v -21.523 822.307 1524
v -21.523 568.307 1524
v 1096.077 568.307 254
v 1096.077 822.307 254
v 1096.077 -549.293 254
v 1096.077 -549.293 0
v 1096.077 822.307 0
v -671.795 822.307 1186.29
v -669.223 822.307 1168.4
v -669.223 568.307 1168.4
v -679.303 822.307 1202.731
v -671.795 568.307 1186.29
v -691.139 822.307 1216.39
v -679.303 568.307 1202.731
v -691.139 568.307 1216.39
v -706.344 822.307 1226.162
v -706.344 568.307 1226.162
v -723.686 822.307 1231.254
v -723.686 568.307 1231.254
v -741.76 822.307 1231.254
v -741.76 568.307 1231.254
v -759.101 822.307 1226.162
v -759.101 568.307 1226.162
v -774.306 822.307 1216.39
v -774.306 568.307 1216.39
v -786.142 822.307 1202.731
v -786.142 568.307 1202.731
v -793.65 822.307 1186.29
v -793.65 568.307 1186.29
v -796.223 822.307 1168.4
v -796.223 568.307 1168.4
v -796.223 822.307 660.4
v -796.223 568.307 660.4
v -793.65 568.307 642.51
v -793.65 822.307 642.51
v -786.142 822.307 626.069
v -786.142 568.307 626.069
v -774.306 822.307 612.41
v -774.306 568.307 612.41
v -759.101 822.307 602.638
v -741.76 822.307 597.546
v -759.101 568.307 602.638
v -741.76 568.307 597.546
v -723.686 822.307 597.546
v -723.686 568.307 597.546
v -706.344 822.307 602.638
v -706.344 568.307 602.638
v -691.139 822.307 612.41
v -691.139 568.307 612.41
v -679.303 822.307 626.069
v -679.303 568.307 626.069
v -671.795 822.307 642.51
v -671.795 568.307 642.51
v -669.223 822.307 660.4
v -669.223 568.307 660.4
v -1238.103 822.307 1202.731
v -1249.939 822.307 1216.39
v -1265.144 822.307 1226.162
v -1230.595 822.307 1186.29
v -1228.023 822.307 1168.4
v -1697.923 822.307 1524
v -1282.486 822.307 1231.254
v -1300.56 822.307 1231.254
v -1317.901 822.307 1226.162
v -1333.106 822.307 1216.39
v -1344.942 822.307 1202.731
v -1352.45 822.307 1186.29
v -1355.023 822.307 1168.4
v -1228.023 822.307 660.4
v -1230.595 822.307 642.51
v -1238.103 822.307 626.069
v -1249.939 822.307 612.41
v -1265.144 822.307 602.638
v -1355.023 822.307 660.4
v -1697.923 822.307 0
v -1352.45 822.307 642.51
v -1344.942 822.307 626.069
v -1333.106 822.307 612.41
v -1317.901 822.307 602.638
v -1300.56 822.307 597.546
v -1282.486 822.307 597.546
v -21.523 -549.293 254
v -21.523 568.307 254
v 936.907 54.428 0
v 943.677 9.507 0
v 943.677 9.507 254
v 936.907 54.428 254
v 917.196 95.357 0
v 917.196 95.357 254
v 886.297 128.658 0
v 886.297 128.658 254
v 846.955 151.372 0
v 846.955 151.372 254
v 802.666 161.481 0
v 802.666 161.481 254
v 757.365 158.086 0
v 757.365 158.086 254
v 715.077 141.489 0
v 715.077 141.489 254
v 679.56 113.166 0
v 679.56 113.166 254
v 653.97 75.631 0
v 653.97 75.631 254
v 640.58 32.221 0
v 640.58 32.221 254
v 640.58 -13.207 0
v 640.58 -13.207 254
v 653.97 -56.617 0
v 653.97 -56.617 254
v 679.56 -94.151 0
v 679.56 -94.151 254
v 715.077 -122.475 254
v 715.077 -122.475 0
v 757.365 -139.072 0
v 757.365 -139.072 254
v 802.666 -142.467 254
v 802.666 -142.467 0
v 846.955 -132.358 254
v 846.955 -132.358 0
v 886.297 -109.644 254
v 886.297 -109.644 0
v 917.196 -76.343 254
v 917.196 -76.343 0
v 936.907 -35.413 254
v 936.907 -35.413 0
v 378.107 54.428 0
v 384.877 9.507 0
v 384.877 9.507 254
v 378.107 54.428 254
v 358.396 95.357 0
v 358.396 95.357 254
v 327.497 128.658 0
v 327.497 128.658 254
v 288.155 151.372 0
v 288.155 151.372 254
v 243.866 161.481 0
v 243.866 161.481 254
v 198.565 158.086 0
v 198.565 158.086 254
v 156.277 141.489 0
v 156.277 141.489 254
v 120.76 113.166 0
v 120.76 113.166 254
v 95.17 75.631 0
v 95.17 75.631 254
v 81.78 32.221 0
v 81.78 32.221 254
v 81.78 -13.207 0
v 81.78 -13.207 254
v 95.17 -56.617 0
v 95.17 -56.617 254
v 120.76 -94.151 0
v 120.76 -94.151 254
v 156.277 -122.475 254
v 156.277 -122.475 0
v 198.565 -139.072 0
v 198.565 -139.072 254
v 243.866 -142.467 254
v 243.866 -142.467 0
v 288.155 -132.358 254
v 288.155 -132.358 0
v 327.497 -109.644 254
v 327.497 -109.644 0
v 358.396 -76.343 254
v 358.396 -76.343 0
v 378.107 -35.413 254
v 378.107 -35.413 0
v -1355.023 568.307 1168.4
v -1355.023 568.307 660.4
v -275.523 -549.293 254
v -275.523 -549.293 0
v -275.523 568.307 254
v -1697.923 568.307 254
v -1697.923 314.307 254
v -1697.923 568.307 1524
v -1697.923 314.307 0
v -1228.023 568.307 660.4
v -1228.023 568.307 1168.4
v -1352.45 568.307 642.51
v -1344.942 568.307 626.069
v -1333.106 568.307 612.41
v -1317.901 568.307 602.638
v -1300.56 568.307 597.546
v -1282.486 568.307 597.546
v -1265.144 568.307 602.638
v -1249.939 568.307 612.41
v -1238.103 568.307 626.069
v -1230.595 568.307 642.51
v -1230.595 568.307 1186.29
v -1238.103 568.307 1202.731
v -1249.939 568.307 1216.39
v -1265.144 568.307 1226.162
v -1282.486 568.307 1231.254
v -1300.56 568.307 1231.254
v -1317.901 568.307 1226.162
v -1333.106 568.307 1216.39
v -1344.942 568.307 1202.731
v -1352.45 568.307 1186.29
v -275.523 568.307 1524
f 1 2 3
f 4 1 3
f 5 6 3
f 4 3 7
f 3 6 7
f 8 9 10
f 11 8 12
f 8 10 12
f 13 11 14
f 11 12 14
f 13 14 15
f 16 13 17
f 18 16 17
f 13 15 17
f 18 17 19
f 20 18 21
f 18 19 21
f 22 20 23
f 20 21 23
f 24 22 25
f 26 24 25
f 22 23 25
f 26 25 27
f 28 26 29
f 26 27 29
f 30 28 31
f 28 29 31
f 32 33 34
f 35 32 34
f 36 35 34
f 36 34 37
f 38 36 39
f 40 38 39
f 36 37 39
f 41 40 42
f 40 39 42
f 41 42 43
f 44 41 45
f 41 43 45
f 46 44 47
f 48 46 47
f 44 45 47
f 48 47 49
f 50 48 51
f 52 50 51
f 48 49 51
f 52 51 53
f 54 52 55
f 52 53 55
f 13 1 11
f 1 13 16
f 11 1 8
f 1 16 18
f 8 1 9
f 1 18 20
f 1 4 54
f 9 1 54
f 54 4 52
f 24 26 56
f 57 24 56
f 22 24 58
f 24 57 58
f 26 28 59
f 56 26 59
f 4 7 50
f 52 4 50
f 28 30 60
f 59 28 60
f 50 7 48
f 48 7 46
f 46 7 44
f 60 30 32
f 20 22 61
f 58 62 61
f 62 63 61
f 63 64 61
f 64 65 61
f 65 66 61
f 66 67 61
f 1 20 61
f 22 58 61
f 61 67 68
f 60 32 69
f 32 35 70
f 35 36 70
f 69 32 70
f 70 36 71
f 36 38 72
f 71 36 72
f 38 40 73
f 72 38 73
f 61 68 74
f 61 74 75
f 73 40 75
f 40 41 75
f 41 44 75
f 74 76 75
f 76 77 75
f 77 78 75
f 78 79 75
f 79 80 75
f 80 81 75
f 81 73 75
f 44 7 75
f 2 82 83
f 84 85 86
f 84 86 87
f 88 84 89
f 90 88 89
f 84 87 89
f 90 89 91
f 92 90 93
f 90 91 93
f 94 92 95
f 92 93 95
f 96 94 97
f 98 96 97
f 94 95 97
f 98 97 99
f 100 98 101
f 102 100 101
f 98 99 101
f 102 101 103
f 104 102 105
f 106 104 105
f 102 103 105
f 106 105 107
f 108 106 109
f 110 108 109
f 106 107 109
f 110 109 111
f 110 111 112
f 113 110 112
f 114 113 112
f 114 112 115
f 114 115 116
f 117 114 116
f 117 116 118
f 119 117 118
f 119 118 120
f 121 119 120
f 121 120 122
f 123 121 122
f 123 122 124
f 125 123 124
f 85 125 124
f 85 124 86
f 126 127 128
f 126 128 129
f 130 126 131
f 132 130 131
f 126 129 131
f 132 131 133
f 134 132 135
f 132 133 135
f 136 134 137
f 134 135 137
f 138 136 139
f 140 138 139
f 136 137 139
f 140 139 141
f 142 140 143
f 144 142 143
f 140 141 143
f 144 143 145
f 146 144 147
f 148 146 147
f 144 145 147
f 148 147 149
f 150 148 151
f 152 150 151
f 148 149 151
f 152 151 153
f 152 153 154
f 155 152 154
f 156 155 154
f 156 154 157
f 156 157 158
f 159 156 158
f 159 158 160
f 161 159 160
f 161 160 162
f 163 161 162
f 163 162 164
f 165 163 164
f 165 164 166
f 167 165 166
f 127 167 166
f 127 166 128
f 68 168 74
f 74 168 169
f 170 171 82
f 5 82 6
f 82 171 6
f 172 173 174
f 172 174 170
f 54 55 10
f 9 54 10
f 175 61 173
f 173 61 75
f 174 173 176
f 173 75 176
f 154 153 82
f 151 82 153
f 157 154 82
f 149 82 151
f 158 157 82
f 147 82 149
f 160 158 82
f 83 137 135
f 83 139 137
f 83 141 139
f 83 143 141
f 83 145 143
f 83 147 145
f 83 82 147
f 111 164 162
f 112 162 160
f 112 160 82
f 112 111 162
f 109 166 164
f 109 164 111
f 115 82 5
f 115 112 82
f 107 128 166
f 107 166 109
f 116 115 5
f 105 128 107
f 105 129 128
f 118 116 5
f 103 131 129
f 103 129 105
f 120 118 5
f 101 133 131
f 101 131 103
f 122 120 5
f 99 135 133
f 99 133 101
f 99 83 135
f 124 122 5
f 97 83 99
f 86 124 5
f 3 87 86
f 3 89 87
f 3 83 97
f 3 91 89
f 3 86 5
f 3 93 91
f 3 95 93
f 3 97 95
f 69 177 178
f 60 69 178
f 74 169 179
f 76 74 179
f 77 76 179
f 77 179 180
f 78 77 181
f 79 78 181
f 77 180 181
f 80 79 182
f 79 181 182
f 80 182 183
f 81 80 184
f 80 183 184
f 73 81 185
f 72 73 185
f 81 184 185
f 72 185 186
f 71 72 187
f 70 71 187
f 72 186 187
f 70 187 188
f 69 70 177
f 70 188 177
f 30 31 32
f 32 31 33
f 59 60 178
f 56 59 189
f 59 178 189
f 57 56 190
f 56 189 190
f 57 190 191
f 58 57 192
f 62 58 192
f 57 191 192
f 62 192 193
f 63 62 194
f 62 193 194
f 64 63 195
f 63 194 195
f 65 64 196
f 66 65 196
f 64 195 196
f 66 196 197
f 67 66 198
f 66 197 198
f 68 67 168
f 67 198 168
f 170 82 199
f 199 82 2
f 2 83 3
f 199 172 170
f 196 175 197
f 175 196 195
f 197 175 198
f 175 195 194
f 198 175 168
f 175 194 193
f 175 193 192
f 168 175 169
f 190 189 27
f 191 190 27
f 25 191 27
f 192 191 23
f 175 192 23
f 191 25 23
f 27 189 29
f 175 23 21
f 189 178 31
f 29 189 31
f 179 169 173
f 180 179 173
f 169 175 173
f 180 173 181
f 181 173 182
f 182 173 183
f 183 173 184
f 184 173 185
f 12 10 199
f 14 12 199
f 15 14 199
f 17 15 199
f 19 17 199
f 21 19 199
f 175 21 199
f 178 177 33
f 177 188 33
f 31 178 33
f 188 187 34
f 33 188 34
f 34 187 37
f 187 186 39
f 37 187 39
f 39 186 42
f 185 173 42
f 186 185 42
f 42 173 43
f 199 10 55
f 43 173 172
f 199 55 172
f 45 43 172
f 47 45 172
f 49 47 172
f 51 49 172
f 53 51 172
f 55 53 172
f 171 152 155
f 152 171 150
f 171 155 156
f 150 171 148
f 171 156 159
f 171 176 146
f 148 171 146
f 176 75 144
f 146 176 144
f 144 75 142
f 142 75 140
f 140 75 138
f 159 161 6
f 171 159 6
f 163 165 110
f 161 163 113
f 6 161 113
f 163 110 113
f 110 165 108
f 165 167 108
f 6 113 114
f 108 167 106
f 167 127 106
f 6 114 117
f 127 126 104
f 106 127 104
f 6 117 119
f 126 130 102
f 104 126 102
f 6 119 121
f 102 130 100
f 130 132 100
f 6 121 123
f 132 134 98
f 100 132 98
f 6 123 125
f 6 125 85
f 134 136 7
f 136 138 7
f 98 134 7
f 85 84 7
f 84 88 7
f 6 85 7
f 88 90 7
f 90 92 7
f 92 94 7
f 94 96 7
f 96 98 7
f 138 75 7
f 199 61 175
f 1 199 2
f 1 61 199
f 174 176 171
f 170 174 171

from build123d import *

# Parameters (mm, degrees)
F1_DEPTH  = 254
F3_DEPTH  = 1270
F5_DEPTH  = 701.04
F7_DEPTH  = 2278.38
F9_DEPTH  = 584.2
F10_R     = 152.4
F11_DEPTH = 1562.1


with BuildPart() as f1:
    # F0 (on Top) → F1 (new body)
    with BuildSketch(Plane.XY):
        Polygon((-1697.922529542, 314.3072188771), (-275.522529542, -549.2927811229), (1096.077470458, -549.2927811229), (1096.077470458, 822.3072188771), (-1697.922529542, 822.3072188771), align=None)
    extrude(amount=F1_DEPTH)

    # F2 (on face) → F3 (join)
    with BuildSketch(Plane.XY.offset(254)):
        Polygon((-275.522529542, 568.3072188771), (-275.522529542, -549.2927811229), (-21.522529542, -549.2927811229), (-21.522529542, 568.3072188771), (1096.077470458, 568.3072188771), (1096.077470458, 822.3072188771), (-1697.922529542, 822.3072188771), (-1697.922529542, 568.3072188771), align=None)
    extrude(amount=F3_DEPTH)

    # F4 (on face) → F5 (cut)
    with BuildSketch(Plane.XZ.offset(-568.3072188771)):
        Polygon((1096.077470458, 1524), (-21.522529542, 1524), (1096.077470458, 254), align=None)
    extrude(amount=-F5_DEPTH, mode=Mode.SUBTRACT)

    # F6 (on face) → F7 (cut)
    with BuildSketch(Plane.YZ.offset(-21.522529542)):
        Polygon((-549.2927811229, 254), (568.3072188771, 1524), (-549.2927811229, 1524), align=None)
    extrude(amount=-F7_DEPTH, mode=Mode.SUBTRACT)

    # F8 (on face) → F9 (cut)
    with BuildSketch(Plane.XZ.offset(-568.3072188771)):
        with BuildLine():
            ThreePointArc((-1355.022529542, 1168.4), (-1291.522529542, 1104.9), (-1228.022529542, 1168.4))
            ThreePointArc((-1228.022529542, 1168.4), (-1291.522529542, 1231.9), (-1355.022529542, 1168.4))
        make_face()
        with BuildLine():
            Line((-1228.022529542, 660.4), (-1228.022529542, 1168.4))
            ThreePointArc((-1228.022529542, 1168.4), (-1291.522529542, 1104.9), (-1355.022529542, 1168.4))
            Line((-1355.022529542, 1168.4), (-1355.022529542, 660.4))
            ThreePointArc((-1355.022529542, 660.4), (-1291.522529542, 723.9), (-1228.022529542, 660.4))
        make_face()
        with BuildLine():
            ThreePointArc((-1355.022529542, 660.4), (-1291.522529542, 596.9), (-1228.022529542, 660.4))
            ThreePointArc((-1228.022529542, 660.4), (-1291.522529542, 723.9), (-1355.022529542, 660.4))
        make_face()
        with BuildLine():
            ThreePointArc((-796.222529542, 1168.4), (-732.722529542, 1104.9), (-669.222529542, 1168.4))
            ThreePointArc((-669.222529542, 1168.4), (-732.722529542, 1231.9), (-796.222529542, 1168.4))
        make_face()
        with BuildLine():
            Line((-669.222529542, 660.4), (-669.222529542, 1168.4))
            ThreePointArc((-669.222529542, 1168.4), (-732.722529542, 1104.9), (-796.222529542, 1168.4))
            Line((-796.222529542, 1168.4), (-796.222529542, 660.4))
            ThreePointArc((-796.222529542, 660.4), (-732.722529542, 723.9), (-669.222529542, 660.4))
        make_face()
        with BuildLine():
            ThreePointArc((-796.222529542, 660.4), (-732.722529542, 596.9), (-669.222529542, 660.4))
            ThreePointArc((-669.222529542, 660.4), (-732.722529542, 723.9), (-796.222529542, 660.4))
        make_face()
    extrude(amount=-F9_DEPTH, mode=Mode.SUBTRACT)

    # F10 (on face) → F11 (cut)
    with BuildSketch(Plane.XY.offset(254)):
        with Locations((232.477470458, 9.5072188771)):
            Circle(F10_R)
        with Locations((791.277470458, 9.5072188771)):
            Circle(F10_R)
    extrude(amount=-F11_DEPTH, mode=Mode.SUBTRACT)


solid = f1.part
